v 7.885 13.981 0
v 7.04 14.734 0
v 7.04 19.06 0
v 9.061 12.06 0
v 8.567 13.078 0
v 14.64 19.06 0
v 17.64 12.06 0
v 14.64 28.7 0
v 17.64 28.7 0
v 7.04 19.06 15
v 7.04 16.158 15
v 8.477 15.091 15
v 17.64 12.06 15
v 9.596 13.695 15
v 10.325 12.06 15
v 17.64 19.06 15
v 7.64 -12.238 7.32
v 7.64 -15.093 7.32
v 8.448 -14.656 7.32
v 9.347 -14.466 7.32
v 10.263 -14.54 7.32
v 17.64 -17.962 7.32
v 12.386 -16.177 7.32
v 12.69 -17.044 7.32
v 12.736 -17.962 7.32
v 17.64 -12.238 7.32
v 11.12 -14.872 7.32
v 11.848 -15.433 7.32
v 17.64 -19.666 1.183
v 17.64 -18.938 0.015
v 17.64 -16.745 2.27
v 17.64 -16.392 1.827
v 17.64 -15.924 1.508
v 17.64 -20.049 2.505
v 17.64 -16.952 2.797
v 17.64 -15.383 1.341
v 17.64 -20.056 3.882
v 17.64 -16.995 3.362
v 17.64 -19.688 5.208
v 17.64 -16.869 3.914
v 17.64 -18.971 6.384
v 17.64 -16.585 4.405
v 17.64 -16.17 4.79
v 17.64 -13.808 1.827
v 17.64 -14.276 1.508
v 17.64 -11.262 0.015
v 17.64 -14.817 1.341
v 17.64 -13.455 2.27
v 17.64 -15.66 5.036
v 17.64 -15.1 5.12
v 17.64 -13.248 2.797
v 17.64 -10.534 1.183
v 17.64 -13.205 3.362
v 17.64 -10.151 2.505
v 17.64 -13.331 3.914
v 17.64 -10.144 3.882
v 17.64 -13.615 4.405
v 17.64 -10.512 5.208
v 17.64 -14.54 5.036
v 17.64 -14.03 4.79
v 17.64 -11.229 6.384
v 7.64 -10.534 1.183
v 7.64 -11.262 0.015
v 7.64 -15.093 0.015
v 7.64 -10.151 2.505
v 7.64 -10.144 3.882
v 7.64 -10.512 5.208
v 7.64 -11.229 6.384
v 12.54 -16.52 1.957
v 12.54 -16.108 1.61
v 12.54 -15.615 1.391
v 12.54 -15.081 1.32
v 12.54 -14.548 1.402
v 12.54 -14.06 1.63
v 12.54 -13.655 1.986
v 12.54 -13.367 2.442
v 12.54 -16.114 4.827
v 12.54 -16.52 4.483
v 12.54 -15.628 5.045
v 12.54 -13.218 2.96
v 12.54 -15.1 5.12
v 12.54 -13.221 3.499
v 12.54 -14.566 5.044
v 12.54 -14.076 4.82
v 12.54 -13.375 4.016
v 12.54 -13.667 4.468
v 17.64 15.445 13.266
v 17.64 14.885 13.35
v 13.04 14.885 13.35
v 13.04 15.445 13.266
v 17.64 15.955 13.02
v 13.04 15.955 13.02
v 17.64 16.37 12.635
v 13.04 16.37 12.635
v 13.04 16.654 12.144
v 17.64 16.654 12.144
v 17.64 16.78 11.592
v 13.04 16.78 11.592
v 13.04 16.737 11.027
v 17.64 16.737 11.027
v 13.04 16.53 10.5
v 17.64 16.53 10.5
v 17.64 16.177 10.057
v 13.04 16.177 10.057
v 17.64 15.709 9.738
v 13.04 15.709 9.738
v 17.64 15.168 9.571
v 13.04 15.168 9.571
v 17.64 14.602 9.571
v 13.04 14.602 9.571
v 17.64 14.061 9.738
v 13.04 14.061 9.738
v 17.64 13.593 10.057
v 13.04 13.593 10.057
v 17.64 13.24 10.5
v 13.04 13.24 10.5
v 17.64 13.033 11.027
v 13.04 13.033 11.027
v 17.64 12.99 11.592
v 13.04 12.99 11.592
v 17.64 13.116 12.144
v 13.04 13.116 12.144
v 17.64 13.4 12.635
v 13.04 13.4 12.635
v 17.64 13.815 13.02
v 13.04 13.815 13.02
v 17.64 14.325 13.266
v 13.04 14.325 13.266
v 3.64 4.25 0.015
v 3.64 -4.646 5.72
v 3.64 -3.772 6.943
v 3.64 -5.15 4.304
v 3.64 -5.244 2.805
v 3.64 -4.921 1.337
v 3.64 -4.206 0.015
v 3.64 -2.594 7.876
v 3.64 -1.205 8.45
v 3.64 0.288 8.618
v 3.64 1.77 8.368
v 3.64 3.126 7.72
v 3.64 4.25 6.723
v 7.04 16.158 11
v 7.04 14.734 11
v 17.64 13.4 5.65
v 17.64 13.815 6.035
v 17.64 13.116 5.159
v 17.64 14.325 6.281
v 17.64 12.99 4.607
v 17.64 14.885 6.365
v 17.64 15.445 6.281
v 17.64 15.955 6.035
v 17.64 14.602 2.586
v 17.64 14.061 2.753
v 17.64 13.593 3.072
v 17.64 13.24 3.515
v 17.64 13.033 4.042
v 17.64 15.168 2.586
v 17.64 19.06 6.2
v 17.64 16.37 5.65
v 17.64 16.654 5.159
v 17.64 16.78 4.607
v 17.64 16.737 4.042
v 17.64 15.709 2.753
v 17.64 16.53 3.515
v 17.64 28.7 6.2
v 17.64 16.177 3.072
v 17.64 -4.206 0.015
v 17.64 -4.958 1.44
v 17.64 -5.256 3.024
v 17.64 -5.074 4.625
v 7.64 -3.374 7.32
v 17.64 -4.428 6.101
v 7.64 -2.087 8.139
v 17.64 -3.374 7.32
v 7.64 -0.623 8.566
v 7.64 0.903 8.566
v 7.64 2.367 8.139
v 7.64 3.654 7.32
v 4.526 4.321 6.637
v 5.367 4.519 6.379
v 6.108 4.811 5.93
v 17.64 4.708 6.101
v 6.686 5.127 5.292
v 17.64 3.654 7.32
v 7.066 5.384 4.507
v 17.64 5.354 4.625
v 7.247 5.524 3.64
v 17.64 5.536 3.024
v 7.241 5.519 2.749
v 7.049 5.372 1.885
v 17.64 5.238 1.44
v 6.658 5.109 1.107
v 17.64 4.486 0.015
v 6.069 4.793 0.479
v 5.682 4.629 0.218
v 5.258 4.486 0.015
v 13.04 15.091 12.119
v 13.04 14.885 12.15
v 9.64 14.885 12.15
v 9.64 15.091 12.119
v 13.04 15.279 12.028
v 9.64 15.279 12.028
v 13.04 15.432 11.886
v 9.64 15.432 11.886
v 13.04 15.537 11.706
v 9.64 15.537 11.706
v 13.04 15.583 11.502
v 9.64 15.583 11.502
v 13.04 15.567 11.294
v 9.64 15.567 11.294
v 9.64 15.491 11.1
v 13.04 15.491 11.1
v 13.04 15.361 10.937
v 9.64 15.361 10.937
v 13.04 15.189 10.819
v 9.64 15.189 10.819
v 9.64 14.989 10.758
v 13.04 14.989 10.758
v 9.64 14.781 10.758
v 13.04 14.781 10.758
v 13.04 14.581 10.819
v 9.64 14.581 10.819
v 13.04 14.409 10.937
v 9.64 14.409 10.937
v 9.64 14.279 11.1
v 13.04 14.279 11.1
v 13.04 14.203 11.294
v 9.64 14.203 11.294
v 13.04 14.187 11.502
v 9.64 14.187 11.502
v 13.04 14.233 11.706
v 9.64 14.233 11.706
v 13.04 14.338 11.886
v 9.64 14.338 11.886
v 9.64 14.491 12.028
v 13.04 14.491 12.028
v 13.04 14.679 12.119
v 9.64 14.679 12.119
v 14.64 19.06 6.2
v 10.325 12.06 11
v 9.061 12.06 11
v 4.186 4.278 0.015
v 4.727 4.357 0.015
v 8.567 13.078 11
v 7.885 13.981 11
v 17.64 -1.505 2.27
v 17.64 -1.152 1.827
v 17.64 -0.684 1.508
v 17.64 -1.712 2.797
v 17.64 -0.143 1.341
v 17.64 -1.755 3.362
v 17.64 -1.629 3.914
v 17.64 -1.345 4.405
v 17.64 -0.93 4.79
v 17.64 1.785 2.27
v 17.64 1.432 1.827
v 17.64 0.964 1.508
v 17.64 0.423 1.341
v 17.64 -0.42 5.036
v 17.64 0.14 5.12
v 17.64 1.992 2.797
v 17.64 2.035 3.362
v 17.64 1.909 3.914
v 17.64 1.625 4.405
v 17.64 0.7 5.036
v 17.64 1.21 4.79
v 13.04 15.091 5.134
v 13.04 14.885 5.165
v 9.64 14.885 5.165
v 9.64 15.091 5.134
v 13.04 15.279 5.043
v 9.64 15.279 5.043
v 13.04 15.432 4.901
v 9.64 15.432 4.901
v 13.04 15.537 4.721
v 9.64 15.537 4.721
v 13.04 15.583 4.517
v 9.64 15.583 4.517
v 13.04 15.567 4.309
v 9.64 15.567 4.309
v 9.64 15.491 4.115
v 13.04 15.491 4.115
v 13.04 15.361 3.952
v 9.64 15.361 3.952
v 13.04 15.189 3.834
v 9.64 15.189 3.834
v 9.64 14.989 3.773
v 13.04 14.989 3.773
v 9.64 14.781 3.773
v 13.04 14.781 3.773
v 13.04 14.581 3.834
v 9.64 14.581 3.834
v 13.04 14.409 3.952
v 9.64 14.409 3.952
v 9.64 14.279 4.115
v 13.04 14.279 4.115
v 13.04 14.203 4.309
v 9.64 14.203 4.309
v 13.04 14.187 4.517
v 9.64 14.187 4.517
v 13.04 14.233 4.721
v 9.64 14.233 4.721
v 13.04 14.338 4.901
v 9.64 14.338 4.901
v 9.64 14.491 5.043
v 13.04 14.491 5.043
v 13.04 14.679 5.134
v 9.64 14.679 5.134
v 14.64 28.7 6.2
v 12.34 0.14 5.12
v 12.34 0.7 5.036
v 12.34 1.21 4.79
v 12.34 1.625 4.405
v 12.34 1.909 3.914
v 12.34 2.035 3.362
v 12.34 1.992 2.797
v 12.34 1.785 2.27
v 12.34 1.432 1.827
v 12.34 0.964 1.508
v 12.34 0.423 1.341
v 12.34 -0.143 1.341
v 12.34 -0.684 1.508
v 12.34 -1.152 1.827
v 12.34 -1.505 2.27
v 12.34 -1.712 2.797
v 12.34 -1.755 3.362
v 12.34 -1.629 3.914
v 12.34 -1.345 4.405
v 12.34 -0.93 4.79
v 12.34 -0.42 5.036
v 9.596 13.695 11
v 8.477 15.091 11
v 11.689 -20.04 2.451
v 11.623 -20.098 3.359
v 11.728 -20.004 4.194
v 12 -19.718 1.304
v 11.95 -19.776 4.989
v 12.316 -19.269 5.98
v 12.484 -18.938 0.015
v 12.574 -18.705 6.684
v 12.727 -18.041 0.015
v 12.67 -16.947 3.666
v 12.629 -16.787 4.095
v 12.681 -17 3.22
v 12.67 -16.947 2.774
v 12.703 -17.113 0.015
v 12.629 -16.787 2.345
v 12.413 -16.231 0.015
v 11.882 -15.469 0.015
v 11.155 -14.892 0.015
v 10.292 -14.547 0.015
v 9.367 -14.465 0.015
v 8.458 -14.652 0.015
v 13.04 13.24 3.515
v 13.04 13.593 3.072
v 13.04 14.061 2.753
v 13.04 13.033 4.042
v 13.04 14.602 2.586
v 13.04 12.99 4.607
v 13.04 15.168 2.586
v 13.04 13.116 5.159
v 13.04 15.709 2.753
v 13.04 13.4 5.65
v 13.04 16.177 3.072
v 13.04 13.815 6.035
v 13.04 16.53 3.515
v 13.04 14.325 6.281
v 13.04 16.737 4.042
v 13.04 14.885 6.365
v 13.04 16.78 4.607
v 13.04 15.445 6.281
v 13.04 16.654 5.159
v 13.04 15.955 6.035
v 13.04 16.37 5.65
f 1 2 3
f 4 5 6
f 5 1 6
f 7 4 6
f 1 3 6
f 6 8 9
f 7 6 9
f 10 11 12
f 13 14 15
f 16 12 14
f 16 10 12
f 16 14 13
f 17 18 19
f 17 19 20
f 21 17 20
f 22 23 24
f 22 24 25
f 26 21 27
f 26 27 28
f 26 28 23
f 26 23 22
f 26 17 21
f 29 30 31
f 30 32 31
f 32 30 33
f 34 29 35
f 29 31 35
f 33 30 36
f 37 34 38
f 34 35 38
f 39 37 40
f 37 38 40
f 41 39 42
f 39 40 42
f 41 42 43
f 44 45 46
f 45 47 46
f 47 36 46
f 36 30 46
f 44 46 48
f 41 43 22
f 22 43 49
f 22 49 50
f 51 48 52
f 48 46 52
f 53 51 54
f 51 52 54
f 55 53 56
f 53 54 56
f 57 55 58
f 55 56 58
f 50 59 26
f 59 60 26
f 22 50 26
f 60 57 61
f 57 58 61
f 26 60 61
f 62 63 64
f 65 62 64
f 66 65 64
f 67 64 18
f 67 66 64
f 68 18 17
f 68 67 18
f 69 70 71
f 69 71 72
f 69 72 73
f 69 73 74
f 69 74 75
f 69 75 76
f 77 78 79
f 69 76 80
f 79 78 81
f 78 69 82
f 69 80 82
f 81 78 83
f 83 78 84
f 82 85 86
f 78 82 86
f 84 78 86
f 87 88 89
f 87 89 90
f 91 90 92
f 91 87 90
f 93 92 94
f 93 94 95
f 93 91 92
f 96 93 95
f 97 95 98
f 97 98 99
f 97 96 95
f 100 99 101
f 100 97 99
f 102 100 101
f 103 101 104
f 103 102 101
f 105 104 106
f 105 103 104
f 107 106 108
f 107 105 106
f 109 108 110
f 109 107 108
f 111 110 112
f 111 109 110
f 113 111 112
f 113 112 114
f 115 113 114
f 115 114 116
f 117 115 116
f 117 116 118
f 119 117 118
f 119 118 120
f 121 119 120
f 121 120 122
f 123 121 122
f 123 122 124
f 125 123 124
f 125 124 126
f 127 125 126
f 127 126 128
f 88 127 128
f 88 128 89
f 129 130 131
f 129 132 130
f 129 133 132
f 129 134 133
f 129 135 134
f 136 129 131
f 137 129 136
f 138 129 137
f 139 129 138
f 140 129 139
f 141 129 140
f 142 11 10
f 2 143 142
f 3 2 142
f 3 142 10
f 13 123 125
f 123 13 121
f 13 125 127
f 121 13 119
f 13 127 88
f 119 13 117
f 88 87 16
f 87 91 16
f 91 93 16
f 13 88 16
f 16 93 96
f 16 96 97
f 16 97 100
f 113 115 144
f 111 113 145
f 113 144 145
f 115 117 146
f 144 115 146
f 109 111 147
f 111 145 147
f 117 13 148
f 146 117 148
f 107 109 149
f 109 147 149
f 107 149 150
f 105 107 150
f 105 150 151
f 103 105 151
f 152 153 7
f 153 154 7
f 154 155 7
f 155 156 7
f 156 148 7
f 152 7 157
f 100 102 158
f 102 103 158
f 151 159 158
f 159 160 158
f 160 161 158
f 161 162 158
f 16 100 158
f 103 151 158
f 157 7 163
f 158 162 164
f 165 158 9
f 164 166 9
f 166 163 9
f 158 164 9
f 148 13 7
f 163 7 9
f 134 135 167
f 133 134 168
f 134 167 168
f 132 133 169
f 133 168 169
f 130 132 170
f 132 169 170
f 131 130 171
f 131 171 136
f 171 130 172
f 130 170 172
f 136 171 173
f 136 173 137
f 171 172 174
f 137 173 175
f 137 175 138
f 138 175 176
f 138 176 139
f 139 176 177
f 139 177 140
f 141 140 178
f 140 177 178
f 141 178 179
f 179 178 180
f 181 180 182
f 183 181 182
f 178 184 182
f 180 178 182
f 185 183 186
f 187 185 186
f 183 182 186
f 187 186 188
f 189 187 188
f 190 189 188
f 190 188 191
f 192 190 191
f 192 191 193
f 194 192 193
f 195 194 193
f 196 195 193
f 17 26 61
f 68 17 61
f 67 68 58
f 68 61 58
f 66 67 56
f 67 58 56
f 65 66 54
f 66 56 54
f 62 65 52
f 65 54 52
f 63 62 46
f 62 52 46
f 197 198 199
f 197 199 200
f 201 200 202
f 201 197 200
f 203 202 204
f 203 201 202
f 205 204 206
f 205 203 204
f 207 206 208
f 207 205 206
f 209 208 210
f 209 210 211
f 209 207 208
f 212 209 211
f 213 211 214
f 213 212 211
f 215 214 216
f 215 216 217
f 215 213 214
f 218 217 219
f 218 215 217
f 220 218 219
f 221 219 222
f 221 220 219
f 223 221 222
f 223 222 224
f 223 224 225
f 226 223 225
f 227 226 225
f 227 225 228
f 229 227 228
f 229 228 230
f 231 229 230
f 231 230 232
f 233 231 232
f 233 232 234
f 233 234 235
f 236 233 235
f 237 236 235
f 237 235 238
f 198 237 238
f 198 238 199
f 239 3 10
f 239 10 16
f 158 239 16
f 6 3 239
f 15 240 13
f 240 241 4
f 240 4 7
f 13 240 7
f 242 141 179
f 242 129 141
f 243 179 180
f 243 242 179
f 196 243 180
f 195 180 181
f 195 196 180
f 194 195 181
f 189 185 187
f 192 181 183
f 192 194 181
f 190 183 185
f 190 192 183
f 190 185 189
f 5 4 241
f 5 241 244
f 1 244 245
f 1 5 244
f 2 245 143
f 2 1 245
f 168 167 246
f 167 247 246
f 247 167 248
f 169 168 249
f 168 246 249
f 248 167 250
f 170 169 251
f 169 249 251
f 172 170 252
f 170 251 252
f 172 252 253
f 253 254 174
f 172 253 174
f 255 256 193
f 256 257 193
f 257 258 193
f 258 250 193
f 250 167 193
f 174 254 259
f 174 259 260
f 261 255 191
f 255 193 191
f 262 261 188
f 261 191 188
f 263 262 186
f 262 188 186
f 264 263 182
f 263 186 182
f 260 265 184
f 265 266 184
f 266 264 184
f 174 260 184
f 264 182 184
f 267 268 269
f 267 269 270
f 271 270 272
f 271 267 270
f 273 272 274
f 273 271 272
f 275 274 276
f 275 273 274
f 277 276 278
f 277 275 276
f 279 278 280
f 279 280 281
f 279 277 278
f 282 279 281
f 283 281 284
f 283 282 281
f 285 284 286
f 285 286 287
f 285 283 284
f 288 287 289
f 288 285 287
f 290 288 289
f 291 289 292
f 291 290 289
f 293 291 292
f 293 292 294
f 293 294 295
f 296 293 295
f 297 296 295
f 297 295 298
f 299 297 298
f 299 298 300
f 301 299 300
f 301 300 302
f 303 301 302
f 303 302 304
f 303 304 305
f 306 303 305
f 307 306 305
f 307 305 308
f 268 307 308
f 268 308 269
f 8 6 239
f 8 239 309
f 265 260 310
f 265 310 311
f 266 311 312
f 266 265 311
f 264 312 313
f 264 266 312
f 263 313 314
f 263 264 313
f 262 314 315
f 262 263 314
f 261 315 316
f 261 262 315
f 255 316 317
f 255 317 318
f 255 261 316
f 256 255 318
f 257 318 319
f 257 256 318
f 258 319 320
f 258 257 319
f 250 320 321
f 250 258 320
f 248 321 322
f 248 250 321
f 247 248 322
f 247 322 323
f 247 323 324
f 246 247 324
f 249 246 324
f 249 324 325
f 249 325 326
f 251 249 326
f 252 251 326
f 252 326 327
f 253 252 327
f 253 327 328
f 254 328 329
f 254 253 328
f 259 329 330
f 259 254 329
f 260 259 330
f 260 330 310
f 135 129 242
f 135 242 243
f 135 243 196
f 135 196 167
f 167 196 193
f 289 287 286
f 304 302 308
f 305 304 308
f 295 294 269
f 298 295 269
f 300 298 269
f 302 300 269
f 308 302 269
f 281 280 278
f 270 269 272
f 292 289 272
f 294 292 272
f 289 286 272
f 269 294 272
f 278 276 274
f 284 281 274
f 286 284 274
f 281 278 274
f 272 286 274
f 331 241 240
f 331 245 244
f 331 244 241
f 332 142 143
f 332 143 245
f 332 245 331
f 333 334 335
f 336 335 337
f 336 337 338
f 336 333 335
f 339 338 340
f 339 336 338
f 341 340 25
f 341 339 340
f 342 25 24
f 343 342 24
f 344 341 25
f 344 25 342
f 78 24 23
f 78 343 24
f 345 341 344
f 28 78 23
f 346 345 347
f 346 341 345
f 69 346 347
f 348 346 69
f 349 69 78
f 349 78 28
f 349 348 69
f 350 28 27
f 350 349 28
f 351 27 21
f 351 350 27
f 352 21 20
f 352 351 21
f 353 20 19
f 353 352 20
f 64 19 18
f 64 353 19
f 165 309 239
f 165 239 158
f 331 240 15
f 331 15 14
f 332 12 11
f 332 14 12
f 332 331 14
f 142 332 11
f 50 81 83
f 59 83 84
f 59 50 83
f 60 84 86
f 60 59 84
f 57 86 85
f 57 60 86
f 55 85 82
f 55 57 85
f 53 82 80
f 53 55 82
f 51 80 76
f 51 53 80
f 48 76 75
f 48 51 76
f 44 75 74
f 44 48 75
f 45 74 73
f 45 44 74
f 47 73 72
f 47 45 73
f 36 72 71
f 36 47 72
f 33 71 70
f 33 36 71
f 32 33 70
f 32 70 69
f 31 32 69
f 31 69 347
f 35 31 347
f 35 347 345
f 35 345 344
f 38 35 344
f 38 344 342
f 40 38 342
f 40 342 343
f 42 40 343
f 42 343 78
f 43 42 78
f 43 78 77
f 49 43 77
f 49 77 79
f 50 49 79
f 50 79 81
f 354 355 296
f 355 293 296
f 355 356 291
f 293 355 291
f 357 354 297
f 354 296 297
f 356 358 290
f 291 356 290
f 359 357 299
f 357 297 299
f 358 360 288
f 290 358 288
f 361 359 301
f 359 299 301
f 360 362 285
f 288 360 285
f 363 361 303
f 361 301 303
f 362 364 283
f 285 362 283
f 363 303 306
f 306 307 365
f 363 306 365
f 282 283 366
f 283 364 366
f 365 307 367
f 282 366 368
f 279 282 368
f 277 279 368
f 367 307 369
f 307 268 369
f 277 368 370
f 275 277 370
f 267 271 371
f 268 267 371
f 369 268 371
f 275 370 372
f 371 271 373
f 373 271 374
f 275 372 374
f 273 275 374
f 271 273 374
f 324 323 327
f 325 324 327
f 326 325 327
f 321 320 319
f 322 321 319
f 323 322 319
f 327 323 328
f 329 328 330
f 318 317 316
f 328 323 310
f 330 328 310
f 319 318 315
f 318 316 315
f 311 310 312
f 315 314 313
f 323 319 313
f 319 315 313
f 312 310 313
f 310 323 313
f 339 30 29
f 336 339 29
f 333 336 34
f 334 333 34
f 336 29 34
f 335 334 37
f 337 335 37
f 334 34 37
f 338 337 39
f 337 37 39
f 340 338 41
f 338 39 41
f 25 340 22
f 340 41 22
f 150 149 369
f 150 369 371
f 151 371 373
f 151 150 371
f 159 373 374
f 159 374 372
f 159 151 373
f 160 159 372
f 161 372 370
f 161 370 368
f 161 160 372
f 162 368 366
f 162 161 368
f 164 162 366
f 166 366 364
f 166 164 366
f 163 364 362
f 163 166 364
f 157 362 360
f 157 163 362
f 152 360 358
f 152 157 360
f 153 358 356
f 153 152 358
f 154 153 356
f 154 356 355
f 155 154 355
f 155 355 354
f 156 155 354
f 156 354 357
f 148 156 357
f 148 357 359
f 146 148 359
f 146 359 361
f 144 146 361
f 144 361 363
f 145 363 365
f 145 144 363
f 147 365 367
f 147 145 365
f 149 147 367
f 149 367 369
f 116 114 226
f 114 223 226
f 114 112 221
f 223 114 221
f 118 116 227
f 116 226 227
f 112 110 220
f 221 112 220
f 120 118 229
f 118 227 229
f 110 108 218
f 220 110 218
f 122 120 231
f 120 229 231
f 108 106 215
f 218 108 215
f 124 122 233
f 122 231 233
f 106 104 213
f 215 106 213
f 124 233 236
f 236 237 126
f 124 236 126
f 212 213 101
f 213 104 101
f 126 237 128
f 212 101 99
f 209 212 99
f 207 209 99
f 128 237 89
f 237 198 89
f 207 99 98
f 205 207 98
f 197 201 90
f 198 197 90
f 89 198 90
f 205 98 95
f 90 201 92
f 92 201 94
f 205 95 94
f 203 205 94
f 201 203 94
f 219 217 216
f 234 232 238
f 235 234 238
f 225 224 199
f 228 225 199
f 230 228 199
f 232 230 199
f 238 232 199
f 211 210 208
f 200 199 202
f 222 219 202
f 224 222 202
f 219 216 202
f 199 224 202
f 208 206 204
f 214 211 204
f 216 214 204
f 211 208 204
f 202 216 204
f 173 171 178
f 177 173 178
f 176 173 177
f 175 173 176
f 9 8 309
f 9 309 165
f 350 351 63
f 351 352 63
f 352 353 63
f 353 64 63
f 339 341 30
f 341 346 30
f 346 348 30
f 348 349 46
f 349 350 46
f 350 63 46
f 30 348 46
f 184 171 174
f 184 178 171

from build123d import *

# Parameters (mm, degrees)
BOX_W             = 3
BOX_H             = 10.7
BOX_DEPTH         = 6.2
CYLINDER012_R     = 1.9
CYLINDER012_DEPTH = 4.6
CYLINDER013_R     = 1.9
CYLINDER013_DEPTH = 4.6
CYLINDER014_R     = 1.9
CYLINDER014_DEPTH = 5.3
BOX005_W          = 14
BOX005_H          = 42.7
BOX005_DEPTH      = 13
CYLINDER015_R     = 0.7
CYLINDER015_DEPTH = 8
CYLINDER016_R     = 0.7
CYLINDER016_DEPTH = 8
CYLINDER011_R     = 1.9
CYLINDER011_DEPTH = 5.1
CYLINDER002_R     = 3.2
CYLINDER002_DEPTH = 12
CYLINDER004_R     = 5.8
CYLINDER004_DEPTH = 11.5
CYLINDER005_R     = 7
CYLINDER005_DEPTH = 5
BOX002_W          = 10
BOX002_H          = 30
BOX002_DEPTH      = 10
BOX003_W          = 15
BOX003_H          = 30
BOX003_DEPTH      = 10
BOX001_W          = 10.6
BOX001_H          = 7
BOX001_DEPTH      = 15
CYLINDER001_R     = 5
CYLINDER001_DEPTH = 10
CYLINDER003_R     = 5.4
CYLINDER003_DEPTH = 14


with BuildPart() as cube:
    # Box → Box (new body)
    with BuildSketch(Plane(origin=(14.64, 18, 0), x_dir=(1, 0, 0), z_dir=(0, 0, 1))):
        with Locations((1.5, 5.35)):
            Rectangle(BOX_W, BOX_H)
    extrude(amount=BOX_DEPTH)


with BuildPart() as cylinder012:
    # Cylinder012 → Cylinder012 (new body)
    with BuildSketch(Plane(origin=(17.64, 14.885, 4.465), x_dir=(0, 0, 1), z_dir=(-1, 0, 0))):
        Circle(CYLINDER012_R)
    extrude(amount=CYLINDER012_DEPTH)


with BuildPart() as cylinder013:
    # Cylinder013 → Cylinder013 (new body)
    with BuildSketch(Plane(origin=(17.64, 14.885, 11.45), x_dir=(0, 0, 1), z_dir=(-1, 0, 0))):
        Circle(CYLINDER013_R)
    extrude(amount=CYLINDER013_DEPTH)


with BuildPart() as cylinder014:
    # Cylinder014 → Cylinder014 (new body)
    with BuildSketch(Plane(origin=(17.64, 0.14, 3.22), x_dir=(0, 0, 1), z_dir=(-1, 0, 0))):
        Circle(CYLINDER014_R)
    extrude(amount=CYLINDER014_DEPTH)


with BuildPart() as cube005:
    # Box005 → Box005 (new body)
    with BuildSketch(Plane(origin=(17.64, -22.73, 0), x_dir=(1, 0, 0), z_dir=(0, 0, 1))):
        with Locations((7, 21.35)):
            Rectangle(BOX005_W, BOX005_H)
    extrude(amount=BOX005_DEPTH)


with BuildPart() as cylinder015:
    # Cylinder015 → Cylinder015 (new body)
    with BuildSketch(Plane(origin=(17.64, 14.885, 4.465), x_dir=(0, 0, 1), z_dir=(-1, 0, 0))):
        Circle(CYLINDER015_R)
    extrude(amount=CYLINDER015_DEPTH)


with BuildPart() as cylinder016:
    # Cylinder016 → Cylinder016 (new body)
    with BuildSketch(Plane(origin=(17.64, 14.885, 11.45), x_dir=(0, 0, 1), z_dir=(-1, 0, 0))):
        Circle(CYLINDER016_R)
    extrude(amount=CYLINDER016_DEPTH)


with BuildPart() as fusion005:
    # Cylinder011 → Cylinder011 (new body)
    with BuildSketch(Plane(origin=(17.64, -15.1, 3.22), x_dir=(0, 0, 1), z_dir=(-1, 0, 0))):
        Circle(CYLINDER011_R)
    extrude(amount=CYLINDER011_DEPTH)

    # Fusion005: union Cylinder012, Cylinder013, Cylinder014, Cube005, Cylinder015, Cylinder016
    add(cylinder012.part)
    add(cylinder013.part)
    add(cylinder014.part)
    add(cube005.part)
    add(cylinder015.part)
    add(cylinder016.part)


with BuildPart() as cylinder002:
    # Cylinder002 → Cylinder002 (new body)
    with BuildSketch(Plane(origin=(9.55, -17.66, -3), x_dir=(1, 0, 0), z_dir=(0, 0, 1))):
        Circle(CYLINDER002_R)
    extrude(amount=CYLINDER002_DEPTH)


with BuildPart() as cylinder004:
    # Cylinder004 → Cylinder004 (new body)
    with BuildSketch(Plane(origin=(3.62, 10.05, 0), x_dir=(1, 0, 0), z_dir=(0, 0, 1))):
        Circle(CYLINDER004_R)
    extrude(amount=CYLINDER004_DEPTH)


with BuildPart() as cylinder005:
    # Cylinder005 → Cylinder005 (new body)
    with BuildSketch(Plane(origin=(3.62, 10.05, 11), x_dir=(1, 0, 0), z_dir=(0, 0, 1))):
        Circle(CYLINDER005_R)
    extrude(amount=CYLINDER005_DEPTH)


with BuildPart() as cube002:
    # Box002 → Box002 (new body)
    with BuildSketch(Plane(origin=(7.64, -21.3, 7.32), x_dir=(1, 0, 0), z_dir=(0, 0, 1))):
        with Locations((5, 15)):
            Rectangle(BOX002_W, BOX002_H)
    extrude(amount=BOX002_DEPTH)


with BuildPart() as fusion004:
    # Box003 → Box003 (new body)
    with BuildSketch(Plane(origin=(2.64, -21.3, -9.985), x_dir=(1, 0, 0), z_dir=(0, 0, 1))):
        with Locations((7.5, 15)):
            Rectangle(BOX003_W, BOX003_H)
    extrude(amount=BOX003_DEPTH)

    # Fusion004: union Cylinder002, Cylinder004, Cylinder005, Cube002
    add(cylinder002.part)
    add(cylinder004.part)
    add(cylinder005.part)
    add(cube002.part)


with BuildPart() as cube001:
    # Box001 → Box001 (new body)
    with BuildSketch(Plane(origin=(7.04, 12.06, 0), x_dir=(1, 0, 0), z_dir=(0, 0, 1))):
        with Locations((5.3, 3.5)):
            Rectangle(BOX001_W, BOX001_H)
    extrude(amount=BOX001_DEPTH)


with BuildPart() as cylinder001:
    # Cylinder001 → Cylinder001 (new body)
    with BuildSketch(Plane(origin=(17.64, -15.1, 3.22), x_dir=(0, 0, 1), z_dir=(-1, 0, 0))):
        Circle(CYLINDER001_R)
    extrude(amount=CYLINDER001_DEPTH)


with BuildPart() as fusion006:
    # Cylinder003 → Cylinder003 (new body)
    with BuildSketch(Plane(origin=(17.64, 0.14, 3.22), x_dir=(0, 0, 1), z_dir=(-1, 0, 0))):
        Circle(CYLINDER003_R)
    extrude(amount=CYLINDER003_DEPTH)

    # Fusion: union Cube001, Cylinder001
    add(cube001.part)
    add(cylinder001.part)

    # Cut: cut Fusion004
    add(fusion004.part, mode=Mode.SUBTRACT)

    # Cut001: cut Fusion005
    add(fusion005.part, mode=Mode.SUBTRACT)

    # Fusion006: union Cube
    add(cube.part)


solid = fusion006.part
